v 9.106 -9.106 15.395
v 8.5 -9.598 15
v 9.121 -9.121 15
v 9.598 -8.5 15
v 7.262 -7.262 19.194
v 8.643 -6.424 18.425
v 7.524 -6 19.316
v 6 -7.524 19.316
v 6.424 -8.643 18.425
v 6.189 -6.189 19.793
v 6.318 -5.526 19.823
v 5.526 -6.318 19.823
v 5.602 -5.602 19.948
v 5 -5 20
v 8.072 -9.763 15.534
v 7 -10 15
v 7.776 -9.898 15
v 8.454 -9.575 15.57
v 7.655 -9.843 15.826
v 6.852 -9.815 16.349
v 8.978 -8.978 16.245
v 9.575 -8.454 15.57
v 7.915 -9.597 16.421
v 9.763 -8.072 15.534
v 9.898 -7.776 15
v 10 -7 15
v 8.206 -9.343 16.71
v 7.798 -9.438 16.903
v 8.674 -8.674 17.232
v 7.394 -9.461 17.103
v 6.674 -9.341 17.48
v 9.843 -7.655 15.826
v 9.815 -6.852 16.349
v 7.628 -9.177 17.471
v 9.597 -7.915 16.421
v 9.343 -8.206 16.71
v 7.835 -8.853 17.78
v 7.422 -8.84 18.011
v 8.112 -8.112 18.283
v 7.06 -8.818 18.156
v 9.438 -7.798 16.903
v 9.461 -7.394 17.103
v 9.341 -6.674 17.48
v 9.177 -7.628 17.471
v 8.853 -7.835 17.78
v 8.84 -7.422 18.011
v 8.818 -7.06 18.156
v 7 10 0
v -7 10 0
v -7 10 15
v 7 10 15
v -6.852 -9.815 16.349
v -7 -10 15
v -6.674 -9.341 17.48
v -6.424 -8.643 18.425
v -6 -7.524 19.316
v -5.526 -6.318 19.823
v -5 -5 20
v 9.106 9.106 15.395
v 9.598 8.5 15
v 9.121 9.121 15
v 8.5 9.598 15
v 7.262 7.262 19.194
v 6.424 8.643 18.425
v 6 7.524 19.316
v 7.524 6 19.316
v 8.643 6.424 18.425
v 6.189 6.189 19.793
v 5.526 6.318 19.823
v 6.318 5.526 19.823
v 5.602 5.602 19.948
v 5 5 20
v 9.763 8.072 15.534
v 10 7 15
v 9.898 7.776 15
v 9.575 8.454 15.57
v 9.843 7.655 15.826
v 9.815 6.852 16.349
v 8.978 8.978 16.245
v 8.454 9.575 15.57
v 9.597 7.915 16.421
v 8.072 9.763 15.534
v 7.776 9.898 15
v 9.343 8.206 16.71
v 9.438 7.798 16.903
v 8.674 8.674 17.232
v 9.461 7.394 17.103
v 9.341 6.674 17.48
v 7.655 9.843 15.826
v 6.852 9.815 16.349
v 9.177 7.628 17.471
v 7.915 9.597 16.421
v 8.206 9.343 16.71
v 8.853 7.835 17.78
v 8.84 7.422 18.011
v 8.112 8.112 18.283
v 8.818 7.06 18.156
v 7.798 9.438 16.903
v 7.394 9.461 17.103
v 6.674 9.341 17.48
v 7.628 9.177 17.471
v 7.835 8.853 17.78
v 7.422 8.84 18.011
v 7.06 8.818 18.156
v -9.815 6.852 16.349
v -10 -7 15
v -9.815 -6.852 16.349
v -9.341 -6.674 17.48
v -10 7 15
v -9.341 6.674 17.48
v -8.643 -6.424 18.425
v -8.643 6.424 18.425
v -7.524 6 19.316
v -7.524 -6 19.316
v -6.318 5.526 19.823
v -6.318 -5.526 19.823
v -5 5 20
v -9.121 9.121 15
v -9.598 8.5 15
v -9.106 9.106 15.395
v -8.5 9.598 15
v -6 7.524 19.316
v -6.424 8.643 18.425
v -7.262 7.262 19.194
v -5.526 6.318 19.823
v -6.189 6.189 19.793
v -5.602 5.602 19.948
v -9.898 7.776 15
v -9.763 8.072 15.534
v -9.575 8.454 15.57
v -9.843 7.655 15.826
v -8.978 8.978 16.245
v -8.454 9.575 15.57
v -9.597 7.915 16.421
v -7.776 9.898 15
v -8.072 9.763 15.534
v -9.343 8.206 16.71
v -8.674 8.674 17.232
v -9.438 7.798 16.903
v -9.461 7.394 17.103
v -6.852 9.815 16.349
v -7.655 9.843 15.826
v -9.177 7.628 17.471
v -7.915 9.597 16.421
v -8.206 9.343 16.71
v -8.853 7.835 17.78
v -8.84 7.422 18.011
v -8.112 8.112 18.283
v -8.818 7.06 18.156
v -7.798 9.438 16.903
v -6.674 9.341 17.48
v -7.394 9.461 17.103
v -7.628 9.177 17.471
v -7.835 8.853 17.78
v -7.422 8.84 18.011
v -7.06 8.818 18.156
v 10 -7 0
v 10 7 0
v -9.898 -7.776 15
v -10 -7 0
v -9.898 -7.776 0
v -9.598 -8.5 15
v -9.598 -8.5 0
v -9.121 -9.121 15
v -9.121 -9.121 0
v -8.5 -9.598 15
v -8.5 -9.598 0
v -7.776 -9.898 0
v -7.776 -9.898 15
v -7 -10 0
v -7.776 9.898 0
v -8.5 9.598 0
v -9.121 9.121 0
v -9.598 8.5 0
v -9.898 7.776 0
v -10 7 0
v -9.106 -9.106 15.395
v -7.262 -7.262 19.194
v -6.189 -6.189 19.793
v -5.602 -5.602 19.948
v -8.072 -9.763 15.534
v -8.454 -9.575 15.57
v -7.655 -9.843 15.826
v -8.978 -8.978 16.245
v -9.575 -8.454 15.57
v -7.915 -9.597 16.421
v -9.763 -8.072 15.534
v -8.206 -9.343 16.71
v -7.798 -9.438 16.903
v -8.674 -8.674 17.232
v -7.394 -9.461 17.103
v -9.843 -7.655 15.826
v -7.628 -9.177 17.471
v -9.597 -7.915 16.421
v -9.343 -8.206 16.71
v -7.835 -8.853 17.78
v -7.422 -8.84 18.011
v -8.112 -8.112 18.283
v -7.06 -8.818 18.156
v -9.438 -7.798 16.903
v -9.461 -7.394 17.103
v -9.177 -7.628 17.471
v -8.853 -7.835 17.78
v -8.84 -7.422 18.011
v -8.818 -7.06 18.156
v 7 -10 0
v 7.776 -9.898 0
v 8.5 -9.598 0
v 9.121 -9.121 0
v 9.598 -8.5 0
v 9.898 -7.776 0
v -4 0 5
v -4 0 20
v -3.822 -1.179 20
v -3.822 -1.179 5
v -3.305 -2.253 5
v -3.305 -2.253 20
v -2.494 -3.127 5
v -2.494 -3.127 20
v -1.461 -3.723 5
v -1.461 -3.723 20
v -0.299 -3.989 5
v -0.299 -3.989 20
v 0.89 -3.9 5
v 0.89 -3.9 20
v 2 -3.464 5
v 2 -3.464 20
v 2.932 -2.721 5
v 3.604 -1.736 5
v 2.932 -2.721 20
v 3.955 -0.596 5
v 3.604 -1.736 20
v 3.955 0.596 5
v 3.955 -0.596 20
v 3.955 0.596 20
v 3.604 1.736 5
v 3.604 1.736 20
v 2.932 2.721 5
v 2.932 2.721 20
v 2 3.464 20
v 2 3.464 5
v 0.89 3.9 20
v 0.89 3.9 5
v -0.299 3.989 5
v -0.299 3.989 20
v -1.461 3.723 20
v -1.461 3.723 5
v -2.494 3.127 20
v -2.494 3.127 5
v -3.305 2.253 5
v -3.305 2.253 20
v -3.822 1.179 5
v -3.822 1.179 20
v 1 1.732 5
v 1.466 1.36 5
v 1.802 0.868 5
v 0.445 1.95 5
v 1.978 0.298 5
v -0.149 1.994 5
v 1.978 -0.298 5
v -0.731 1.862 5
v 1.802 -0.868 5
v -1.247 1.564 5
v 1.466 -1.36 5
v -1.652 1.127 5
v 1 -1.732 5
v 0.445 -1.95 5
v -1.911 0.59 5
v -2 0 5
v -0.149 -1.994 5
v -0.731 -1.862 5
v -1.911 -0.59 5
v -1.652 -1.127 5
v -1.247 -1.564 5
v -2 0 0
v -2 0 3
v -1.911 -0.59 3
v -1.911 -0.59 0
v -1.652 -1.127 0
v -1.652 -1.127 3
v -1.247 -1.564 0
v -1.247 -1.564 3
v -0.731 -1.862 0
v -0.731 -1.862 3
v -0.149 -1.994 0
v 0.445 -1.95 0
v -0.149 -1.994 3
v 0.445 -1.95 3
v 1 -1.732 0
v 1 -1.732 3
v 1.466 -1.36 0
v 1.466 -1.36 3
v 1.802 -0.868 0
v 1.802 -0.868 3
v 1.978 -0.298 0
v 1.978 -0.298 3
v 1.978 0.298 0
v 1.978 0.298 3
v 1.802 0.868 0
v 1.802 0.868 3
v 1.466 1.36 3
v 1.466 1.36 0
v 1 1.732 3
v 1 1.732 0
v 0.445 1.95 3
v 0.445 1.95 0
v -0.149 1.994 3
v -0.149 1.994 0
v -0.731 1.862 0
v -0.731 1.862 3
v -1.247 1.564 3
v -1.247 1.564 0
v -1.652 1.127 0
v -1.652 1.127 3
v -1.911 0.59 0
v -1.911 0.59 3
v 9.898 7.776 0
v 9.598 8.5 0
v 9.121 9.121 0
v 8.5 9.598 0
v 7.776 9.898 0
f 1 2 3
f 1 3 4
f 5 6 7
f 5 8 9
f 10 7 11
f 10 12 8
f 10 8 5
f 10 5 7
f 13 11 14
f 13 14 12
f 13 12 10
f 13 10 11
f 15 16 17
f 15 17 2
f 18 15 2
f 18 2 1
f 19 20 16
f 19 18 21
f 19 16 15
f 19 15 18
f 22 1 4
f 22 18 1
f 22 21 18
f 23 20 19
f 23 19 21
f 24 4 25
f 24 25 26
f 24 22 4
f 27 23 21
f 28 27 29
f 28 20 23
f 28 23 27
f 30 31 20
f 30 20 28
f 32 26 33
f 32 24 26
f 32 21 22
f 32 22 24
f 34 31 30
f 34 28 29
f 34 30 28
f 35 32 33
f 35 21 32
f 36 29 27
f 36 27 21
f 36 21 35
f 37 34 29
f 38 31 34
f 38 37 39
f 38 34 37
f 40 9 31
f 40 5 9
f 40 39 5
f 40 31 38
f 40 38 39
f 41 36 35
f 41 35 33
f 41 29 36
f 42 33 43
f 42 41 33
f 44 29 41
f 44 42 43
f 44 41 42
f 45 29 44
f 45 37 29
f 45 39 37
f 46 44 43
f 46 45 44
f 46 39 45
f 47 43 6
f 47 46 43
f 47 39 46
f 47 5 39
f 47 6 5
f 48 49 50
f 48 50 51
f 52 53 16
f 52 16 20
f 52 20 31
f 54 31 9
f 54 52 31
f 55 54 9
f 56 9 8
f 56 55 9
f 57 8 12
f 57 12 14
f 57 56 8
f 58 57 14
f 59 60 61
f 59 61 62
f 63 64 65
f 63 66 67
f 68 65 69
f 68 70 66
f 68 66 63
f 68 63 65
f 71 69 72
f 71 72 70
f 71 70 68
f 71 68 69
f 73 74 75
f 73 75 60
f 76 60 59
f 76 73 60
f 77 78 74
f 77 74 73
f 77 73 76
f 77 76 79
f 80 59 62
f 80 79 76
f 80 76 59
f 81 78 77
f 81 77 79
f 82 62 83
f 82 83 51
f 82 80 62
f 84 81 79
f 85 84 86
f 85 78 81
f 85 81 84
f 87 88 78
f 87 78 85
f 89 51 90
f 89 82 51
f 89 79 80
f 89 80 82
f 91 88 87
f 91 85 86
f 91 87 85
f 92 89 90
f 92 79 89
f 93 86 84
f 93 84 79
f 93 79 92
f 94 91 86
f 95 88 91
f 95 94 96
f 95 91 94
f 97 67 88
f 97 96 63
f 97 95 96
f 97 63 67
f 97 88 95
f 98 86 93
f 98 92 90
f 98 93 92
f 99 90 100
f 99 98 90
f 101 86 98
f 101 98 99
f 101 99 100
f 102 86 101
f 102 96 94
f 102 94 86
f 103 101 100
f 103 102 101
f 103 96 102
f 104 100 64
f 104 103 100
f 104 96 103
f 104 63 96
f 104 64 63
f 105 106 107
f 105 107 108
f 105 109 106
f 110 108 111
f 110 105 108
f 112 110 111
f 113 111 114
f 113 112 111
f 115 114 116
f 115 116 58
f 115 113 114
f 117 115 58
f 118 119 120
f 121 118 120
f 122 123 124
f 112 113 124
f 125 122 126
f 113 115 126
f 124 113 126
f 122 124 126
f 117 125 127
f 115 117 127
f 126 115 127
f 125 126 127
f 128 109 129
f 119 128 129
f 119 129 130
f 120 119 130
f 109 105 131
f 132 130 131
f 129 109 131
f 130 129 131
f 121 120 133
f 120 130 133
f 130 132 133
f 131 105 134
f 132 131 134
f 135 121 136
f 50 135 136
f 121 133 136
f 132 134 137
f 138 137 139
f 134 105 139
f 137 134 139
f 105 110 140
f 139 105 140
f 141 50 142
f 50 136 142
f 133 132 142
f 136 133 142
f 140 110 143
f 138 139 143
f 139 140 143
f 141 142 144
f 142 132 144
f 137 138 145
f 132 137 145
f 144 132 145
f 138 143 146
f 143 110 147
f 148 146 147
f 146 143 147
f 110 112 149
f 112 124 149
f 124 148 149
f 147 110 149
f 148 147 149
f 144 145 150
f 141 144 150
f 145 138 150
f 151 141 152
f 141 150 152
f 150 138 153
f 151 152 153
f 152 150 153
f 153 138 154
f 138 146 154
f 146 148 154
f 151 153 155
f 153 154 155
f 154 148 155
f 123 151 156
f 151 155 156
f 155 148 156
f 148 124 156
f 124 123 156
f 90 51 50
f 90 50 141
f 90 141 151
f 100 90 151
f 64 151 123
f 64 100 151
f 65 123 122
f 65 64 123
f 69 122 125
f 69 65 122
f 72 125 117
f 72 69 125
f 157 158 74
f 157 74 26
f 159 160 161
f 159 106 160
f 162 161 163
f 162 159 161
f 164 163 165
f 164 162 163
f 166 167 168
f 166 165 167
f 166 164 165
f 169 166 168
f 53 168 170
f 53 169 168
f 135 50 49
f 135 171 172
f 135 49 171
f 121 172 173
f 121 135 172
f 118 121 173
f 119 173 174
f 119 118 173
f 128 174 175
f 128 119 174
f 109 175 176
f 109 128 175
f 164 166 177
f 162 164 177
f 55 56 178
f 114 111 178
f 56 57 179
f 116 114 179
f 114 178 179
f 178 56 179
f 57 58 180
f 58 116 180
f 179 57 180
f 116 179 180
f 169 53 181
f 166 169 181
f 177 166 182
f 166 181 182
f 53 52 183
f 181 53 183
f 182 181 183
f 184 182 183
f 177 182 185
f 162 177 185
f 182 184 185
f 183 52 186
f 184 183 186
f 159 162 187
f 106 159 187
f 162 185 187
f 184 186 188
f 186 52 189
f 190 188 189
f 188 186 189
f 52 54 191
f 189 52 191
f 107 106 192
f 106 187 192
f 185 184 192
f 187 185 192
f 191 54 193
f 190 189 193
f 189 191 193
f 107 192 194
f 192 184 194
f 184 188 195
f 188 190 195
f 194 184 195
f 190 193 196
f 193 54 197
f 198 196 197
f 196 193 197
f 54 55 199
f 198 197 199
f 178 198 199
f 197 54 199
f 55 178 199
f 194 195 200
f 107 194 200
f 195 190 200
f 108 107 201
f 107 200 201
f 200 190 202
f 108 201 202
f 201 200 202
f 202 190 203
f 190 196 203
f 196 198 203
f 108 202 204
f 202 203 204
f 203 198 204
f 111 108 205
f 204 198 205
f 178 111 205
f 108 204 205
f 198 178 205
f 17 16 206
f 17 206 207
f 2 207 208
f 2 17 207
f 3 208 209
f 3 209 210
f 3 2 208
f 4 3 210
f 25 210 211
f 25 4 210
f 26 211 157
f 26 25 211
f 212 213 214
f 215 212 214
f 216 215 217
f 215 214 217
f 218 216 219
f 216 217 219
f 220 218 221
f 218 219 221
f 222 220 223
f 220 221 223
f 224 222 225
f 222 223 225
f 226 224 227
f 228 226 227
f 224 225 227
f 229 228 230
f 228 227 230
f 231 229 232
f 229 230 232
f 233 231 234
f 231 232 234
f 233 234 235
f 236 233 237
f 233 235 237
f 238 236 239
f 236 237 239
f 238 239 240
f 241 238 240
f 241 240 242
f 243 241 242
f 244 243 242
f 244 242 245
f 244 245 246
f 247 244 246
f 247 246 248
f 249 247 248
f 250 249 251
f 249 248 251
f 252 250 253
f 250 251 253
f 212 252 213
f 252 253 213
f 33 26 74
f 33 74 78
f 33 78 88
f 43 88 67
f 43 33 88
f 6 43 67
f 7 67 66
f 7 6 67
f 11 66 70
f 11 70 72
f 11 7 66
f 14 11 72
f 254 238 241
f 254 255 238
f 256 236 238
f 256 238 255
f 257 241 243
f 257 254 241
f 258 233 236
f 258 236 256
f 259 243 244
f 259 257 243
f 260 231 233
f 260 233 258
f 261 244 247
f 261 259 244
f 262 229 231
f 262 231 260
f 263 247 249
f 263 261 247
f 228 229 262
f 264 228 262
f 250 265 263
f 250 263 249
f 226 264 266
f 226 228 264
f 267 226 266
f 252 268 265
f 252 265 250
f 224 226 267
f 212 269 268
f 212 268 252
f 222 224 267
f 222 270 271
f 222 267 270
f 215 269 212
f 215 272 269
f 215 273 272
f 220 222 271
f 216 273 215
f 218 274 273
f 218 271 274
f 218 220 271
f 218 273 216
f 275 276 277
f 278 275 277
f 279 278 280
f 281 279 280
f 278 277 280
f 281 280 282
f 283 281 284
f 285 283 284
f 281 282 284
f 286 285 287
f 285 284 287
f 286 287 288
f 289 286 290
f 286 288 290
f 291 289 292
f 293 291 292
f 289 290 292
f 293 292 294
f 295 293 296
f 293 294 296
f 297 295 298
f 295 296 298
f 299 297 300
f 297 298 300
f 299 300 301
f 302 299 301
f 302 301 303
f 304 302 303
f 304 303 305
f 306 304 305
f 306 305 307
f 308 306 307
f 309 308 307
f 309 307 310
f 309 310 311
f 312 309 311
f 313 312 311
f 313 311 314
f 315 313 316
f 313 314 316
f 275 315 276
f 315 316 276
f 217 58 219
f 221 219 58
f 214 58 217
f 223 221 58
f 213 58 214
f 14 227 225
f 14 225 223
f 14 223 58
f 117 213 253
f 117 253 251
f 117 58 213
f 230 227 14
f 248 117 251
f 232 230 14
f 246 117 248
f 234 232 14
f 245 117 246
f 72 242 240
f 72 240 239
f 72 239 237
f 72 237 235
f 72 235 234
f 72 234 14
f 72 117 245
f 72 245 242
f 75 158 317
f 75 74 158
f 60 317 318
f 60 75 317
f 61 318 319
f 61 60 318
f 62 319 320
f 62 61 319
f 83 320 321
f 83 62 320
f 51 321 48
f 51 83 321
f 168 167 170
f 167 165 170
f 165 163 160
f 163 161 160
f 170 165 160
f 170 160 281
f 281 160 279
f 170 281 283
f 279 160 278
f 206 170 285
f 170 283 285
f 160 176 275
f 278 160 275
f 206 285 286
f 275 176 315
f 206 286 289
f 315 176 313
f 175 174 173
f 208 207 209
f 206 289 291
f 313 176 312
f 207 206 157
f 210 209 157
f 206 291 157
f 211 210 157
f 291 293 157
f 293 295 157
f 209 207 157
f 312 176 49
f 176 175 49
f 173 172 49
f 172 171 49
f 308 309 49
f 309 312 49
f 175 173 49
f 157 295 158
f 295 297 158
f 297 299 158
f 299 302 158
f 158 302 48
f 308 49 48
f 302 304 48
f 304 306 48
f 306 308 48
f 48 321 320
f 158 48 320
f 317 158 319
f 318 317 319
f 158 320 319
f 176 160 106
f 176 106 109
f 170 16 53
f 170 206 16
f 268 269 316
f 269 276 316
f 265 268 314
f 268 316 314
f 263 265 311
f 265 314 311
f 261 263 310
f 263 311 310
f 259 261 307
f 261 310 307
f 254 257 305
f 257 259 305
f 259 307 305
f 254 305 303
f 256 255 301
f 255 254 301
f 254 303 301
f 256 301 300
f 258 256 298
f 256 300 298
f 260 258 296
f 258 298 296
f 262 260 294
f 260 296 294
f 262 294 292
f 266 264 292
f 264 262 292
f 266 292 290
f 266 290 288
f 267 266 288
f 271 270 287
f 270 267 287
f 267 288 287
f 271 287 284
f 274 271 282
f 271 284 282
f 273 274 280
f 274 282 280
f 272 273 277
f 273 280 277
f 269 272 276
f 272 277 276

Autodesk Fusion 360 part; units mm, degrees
sketch "Sketch1" plane through (0, 0, 0) normal (0, 0, 1) x (1, 0, 0)
  line L0 (10, -10) -> (-10, -10)
  line L1 (-10, -10) -> (-10, 10)
  line L2 (-10, 10) -> (10, 10)
  line L3 (10, 10) -> (10, -10)
  line L4 (10, -10) -> (-10, 10) construction
  line L5 (-10, -10) -> (10, 10) construction
  dimension "d1" = 20
  dimension "d2" = 20
extrude "Extrude1" add sketch "Sketch1" along normal blind 20
sketch "Sketch2" plane through (0, 0, 20) normal (0, 0, 1) x (-1, 0, 0)
  line L0 (-10, -10) -> (10, -10)
  line L1 (10, -10) -> (10, 10)
  line L2 (10, 10) -> (-10, 10)
  line L3 (-10, 10) -> (-10, -10)
  circle A0 centre (0, 0) radius 2
  circle A1 centre (0, 0) radius 4
  dimension "d5" = 4
  dimension "d6" = 8
extrude "Extrude2" cut sketch "Sketch2" against normal blind 40 contours A0
extrude "Extrude3" cut sketch "Sketch2" against normal blind 17 contours A1
sketch "Sketch3" plane through (10, 0, 0) normal (1, 0, 0) x (0, 1, 0)
  line L0 (-10, 0) -> (10, 0)
  line L1 (10, 0) -> (10, 20)
  line L2 (10, 20) -> (-10, 20)
  line L3 (-10, 20) -> (-10, 0)
  circle A0 centre (0, 18) radius 3.5
  line L4 (0, 0) -> (0, 24.4173) construction
  dimension "d11" = 7
  dimension "d20" = 2
extrude "Extrude4" cut sketch "Sketch3" against normal blind 22 contours L2 A0 picked at (-0.83, 20.3844)
fillet "Fillet1" radius 5 6 edges at (10, -6.4361, 20) (0, -10, 20) (-10, -6.4361, 20) (-10, 6.4361, 20) (0, 10, 20) (10, 6.4361, 20)
fillet "Fillet2" radius 3 8 edges at (10, 10, 7.5) (8.5355, 8.5355, 18.5355) (10, -10, 7.5) (8.5355, -8.5355, 18.5355) (-10, 10, 7.5) (-8.5355, 8.5355, 18.5355) (-10, -10, 7.5) (-8.5355, -8.5355, 18.5355)
extrude "Extrude5" add 1 faces at (-3.311, 0.2981, 3) along direction (0, 0, 1) blind 2
